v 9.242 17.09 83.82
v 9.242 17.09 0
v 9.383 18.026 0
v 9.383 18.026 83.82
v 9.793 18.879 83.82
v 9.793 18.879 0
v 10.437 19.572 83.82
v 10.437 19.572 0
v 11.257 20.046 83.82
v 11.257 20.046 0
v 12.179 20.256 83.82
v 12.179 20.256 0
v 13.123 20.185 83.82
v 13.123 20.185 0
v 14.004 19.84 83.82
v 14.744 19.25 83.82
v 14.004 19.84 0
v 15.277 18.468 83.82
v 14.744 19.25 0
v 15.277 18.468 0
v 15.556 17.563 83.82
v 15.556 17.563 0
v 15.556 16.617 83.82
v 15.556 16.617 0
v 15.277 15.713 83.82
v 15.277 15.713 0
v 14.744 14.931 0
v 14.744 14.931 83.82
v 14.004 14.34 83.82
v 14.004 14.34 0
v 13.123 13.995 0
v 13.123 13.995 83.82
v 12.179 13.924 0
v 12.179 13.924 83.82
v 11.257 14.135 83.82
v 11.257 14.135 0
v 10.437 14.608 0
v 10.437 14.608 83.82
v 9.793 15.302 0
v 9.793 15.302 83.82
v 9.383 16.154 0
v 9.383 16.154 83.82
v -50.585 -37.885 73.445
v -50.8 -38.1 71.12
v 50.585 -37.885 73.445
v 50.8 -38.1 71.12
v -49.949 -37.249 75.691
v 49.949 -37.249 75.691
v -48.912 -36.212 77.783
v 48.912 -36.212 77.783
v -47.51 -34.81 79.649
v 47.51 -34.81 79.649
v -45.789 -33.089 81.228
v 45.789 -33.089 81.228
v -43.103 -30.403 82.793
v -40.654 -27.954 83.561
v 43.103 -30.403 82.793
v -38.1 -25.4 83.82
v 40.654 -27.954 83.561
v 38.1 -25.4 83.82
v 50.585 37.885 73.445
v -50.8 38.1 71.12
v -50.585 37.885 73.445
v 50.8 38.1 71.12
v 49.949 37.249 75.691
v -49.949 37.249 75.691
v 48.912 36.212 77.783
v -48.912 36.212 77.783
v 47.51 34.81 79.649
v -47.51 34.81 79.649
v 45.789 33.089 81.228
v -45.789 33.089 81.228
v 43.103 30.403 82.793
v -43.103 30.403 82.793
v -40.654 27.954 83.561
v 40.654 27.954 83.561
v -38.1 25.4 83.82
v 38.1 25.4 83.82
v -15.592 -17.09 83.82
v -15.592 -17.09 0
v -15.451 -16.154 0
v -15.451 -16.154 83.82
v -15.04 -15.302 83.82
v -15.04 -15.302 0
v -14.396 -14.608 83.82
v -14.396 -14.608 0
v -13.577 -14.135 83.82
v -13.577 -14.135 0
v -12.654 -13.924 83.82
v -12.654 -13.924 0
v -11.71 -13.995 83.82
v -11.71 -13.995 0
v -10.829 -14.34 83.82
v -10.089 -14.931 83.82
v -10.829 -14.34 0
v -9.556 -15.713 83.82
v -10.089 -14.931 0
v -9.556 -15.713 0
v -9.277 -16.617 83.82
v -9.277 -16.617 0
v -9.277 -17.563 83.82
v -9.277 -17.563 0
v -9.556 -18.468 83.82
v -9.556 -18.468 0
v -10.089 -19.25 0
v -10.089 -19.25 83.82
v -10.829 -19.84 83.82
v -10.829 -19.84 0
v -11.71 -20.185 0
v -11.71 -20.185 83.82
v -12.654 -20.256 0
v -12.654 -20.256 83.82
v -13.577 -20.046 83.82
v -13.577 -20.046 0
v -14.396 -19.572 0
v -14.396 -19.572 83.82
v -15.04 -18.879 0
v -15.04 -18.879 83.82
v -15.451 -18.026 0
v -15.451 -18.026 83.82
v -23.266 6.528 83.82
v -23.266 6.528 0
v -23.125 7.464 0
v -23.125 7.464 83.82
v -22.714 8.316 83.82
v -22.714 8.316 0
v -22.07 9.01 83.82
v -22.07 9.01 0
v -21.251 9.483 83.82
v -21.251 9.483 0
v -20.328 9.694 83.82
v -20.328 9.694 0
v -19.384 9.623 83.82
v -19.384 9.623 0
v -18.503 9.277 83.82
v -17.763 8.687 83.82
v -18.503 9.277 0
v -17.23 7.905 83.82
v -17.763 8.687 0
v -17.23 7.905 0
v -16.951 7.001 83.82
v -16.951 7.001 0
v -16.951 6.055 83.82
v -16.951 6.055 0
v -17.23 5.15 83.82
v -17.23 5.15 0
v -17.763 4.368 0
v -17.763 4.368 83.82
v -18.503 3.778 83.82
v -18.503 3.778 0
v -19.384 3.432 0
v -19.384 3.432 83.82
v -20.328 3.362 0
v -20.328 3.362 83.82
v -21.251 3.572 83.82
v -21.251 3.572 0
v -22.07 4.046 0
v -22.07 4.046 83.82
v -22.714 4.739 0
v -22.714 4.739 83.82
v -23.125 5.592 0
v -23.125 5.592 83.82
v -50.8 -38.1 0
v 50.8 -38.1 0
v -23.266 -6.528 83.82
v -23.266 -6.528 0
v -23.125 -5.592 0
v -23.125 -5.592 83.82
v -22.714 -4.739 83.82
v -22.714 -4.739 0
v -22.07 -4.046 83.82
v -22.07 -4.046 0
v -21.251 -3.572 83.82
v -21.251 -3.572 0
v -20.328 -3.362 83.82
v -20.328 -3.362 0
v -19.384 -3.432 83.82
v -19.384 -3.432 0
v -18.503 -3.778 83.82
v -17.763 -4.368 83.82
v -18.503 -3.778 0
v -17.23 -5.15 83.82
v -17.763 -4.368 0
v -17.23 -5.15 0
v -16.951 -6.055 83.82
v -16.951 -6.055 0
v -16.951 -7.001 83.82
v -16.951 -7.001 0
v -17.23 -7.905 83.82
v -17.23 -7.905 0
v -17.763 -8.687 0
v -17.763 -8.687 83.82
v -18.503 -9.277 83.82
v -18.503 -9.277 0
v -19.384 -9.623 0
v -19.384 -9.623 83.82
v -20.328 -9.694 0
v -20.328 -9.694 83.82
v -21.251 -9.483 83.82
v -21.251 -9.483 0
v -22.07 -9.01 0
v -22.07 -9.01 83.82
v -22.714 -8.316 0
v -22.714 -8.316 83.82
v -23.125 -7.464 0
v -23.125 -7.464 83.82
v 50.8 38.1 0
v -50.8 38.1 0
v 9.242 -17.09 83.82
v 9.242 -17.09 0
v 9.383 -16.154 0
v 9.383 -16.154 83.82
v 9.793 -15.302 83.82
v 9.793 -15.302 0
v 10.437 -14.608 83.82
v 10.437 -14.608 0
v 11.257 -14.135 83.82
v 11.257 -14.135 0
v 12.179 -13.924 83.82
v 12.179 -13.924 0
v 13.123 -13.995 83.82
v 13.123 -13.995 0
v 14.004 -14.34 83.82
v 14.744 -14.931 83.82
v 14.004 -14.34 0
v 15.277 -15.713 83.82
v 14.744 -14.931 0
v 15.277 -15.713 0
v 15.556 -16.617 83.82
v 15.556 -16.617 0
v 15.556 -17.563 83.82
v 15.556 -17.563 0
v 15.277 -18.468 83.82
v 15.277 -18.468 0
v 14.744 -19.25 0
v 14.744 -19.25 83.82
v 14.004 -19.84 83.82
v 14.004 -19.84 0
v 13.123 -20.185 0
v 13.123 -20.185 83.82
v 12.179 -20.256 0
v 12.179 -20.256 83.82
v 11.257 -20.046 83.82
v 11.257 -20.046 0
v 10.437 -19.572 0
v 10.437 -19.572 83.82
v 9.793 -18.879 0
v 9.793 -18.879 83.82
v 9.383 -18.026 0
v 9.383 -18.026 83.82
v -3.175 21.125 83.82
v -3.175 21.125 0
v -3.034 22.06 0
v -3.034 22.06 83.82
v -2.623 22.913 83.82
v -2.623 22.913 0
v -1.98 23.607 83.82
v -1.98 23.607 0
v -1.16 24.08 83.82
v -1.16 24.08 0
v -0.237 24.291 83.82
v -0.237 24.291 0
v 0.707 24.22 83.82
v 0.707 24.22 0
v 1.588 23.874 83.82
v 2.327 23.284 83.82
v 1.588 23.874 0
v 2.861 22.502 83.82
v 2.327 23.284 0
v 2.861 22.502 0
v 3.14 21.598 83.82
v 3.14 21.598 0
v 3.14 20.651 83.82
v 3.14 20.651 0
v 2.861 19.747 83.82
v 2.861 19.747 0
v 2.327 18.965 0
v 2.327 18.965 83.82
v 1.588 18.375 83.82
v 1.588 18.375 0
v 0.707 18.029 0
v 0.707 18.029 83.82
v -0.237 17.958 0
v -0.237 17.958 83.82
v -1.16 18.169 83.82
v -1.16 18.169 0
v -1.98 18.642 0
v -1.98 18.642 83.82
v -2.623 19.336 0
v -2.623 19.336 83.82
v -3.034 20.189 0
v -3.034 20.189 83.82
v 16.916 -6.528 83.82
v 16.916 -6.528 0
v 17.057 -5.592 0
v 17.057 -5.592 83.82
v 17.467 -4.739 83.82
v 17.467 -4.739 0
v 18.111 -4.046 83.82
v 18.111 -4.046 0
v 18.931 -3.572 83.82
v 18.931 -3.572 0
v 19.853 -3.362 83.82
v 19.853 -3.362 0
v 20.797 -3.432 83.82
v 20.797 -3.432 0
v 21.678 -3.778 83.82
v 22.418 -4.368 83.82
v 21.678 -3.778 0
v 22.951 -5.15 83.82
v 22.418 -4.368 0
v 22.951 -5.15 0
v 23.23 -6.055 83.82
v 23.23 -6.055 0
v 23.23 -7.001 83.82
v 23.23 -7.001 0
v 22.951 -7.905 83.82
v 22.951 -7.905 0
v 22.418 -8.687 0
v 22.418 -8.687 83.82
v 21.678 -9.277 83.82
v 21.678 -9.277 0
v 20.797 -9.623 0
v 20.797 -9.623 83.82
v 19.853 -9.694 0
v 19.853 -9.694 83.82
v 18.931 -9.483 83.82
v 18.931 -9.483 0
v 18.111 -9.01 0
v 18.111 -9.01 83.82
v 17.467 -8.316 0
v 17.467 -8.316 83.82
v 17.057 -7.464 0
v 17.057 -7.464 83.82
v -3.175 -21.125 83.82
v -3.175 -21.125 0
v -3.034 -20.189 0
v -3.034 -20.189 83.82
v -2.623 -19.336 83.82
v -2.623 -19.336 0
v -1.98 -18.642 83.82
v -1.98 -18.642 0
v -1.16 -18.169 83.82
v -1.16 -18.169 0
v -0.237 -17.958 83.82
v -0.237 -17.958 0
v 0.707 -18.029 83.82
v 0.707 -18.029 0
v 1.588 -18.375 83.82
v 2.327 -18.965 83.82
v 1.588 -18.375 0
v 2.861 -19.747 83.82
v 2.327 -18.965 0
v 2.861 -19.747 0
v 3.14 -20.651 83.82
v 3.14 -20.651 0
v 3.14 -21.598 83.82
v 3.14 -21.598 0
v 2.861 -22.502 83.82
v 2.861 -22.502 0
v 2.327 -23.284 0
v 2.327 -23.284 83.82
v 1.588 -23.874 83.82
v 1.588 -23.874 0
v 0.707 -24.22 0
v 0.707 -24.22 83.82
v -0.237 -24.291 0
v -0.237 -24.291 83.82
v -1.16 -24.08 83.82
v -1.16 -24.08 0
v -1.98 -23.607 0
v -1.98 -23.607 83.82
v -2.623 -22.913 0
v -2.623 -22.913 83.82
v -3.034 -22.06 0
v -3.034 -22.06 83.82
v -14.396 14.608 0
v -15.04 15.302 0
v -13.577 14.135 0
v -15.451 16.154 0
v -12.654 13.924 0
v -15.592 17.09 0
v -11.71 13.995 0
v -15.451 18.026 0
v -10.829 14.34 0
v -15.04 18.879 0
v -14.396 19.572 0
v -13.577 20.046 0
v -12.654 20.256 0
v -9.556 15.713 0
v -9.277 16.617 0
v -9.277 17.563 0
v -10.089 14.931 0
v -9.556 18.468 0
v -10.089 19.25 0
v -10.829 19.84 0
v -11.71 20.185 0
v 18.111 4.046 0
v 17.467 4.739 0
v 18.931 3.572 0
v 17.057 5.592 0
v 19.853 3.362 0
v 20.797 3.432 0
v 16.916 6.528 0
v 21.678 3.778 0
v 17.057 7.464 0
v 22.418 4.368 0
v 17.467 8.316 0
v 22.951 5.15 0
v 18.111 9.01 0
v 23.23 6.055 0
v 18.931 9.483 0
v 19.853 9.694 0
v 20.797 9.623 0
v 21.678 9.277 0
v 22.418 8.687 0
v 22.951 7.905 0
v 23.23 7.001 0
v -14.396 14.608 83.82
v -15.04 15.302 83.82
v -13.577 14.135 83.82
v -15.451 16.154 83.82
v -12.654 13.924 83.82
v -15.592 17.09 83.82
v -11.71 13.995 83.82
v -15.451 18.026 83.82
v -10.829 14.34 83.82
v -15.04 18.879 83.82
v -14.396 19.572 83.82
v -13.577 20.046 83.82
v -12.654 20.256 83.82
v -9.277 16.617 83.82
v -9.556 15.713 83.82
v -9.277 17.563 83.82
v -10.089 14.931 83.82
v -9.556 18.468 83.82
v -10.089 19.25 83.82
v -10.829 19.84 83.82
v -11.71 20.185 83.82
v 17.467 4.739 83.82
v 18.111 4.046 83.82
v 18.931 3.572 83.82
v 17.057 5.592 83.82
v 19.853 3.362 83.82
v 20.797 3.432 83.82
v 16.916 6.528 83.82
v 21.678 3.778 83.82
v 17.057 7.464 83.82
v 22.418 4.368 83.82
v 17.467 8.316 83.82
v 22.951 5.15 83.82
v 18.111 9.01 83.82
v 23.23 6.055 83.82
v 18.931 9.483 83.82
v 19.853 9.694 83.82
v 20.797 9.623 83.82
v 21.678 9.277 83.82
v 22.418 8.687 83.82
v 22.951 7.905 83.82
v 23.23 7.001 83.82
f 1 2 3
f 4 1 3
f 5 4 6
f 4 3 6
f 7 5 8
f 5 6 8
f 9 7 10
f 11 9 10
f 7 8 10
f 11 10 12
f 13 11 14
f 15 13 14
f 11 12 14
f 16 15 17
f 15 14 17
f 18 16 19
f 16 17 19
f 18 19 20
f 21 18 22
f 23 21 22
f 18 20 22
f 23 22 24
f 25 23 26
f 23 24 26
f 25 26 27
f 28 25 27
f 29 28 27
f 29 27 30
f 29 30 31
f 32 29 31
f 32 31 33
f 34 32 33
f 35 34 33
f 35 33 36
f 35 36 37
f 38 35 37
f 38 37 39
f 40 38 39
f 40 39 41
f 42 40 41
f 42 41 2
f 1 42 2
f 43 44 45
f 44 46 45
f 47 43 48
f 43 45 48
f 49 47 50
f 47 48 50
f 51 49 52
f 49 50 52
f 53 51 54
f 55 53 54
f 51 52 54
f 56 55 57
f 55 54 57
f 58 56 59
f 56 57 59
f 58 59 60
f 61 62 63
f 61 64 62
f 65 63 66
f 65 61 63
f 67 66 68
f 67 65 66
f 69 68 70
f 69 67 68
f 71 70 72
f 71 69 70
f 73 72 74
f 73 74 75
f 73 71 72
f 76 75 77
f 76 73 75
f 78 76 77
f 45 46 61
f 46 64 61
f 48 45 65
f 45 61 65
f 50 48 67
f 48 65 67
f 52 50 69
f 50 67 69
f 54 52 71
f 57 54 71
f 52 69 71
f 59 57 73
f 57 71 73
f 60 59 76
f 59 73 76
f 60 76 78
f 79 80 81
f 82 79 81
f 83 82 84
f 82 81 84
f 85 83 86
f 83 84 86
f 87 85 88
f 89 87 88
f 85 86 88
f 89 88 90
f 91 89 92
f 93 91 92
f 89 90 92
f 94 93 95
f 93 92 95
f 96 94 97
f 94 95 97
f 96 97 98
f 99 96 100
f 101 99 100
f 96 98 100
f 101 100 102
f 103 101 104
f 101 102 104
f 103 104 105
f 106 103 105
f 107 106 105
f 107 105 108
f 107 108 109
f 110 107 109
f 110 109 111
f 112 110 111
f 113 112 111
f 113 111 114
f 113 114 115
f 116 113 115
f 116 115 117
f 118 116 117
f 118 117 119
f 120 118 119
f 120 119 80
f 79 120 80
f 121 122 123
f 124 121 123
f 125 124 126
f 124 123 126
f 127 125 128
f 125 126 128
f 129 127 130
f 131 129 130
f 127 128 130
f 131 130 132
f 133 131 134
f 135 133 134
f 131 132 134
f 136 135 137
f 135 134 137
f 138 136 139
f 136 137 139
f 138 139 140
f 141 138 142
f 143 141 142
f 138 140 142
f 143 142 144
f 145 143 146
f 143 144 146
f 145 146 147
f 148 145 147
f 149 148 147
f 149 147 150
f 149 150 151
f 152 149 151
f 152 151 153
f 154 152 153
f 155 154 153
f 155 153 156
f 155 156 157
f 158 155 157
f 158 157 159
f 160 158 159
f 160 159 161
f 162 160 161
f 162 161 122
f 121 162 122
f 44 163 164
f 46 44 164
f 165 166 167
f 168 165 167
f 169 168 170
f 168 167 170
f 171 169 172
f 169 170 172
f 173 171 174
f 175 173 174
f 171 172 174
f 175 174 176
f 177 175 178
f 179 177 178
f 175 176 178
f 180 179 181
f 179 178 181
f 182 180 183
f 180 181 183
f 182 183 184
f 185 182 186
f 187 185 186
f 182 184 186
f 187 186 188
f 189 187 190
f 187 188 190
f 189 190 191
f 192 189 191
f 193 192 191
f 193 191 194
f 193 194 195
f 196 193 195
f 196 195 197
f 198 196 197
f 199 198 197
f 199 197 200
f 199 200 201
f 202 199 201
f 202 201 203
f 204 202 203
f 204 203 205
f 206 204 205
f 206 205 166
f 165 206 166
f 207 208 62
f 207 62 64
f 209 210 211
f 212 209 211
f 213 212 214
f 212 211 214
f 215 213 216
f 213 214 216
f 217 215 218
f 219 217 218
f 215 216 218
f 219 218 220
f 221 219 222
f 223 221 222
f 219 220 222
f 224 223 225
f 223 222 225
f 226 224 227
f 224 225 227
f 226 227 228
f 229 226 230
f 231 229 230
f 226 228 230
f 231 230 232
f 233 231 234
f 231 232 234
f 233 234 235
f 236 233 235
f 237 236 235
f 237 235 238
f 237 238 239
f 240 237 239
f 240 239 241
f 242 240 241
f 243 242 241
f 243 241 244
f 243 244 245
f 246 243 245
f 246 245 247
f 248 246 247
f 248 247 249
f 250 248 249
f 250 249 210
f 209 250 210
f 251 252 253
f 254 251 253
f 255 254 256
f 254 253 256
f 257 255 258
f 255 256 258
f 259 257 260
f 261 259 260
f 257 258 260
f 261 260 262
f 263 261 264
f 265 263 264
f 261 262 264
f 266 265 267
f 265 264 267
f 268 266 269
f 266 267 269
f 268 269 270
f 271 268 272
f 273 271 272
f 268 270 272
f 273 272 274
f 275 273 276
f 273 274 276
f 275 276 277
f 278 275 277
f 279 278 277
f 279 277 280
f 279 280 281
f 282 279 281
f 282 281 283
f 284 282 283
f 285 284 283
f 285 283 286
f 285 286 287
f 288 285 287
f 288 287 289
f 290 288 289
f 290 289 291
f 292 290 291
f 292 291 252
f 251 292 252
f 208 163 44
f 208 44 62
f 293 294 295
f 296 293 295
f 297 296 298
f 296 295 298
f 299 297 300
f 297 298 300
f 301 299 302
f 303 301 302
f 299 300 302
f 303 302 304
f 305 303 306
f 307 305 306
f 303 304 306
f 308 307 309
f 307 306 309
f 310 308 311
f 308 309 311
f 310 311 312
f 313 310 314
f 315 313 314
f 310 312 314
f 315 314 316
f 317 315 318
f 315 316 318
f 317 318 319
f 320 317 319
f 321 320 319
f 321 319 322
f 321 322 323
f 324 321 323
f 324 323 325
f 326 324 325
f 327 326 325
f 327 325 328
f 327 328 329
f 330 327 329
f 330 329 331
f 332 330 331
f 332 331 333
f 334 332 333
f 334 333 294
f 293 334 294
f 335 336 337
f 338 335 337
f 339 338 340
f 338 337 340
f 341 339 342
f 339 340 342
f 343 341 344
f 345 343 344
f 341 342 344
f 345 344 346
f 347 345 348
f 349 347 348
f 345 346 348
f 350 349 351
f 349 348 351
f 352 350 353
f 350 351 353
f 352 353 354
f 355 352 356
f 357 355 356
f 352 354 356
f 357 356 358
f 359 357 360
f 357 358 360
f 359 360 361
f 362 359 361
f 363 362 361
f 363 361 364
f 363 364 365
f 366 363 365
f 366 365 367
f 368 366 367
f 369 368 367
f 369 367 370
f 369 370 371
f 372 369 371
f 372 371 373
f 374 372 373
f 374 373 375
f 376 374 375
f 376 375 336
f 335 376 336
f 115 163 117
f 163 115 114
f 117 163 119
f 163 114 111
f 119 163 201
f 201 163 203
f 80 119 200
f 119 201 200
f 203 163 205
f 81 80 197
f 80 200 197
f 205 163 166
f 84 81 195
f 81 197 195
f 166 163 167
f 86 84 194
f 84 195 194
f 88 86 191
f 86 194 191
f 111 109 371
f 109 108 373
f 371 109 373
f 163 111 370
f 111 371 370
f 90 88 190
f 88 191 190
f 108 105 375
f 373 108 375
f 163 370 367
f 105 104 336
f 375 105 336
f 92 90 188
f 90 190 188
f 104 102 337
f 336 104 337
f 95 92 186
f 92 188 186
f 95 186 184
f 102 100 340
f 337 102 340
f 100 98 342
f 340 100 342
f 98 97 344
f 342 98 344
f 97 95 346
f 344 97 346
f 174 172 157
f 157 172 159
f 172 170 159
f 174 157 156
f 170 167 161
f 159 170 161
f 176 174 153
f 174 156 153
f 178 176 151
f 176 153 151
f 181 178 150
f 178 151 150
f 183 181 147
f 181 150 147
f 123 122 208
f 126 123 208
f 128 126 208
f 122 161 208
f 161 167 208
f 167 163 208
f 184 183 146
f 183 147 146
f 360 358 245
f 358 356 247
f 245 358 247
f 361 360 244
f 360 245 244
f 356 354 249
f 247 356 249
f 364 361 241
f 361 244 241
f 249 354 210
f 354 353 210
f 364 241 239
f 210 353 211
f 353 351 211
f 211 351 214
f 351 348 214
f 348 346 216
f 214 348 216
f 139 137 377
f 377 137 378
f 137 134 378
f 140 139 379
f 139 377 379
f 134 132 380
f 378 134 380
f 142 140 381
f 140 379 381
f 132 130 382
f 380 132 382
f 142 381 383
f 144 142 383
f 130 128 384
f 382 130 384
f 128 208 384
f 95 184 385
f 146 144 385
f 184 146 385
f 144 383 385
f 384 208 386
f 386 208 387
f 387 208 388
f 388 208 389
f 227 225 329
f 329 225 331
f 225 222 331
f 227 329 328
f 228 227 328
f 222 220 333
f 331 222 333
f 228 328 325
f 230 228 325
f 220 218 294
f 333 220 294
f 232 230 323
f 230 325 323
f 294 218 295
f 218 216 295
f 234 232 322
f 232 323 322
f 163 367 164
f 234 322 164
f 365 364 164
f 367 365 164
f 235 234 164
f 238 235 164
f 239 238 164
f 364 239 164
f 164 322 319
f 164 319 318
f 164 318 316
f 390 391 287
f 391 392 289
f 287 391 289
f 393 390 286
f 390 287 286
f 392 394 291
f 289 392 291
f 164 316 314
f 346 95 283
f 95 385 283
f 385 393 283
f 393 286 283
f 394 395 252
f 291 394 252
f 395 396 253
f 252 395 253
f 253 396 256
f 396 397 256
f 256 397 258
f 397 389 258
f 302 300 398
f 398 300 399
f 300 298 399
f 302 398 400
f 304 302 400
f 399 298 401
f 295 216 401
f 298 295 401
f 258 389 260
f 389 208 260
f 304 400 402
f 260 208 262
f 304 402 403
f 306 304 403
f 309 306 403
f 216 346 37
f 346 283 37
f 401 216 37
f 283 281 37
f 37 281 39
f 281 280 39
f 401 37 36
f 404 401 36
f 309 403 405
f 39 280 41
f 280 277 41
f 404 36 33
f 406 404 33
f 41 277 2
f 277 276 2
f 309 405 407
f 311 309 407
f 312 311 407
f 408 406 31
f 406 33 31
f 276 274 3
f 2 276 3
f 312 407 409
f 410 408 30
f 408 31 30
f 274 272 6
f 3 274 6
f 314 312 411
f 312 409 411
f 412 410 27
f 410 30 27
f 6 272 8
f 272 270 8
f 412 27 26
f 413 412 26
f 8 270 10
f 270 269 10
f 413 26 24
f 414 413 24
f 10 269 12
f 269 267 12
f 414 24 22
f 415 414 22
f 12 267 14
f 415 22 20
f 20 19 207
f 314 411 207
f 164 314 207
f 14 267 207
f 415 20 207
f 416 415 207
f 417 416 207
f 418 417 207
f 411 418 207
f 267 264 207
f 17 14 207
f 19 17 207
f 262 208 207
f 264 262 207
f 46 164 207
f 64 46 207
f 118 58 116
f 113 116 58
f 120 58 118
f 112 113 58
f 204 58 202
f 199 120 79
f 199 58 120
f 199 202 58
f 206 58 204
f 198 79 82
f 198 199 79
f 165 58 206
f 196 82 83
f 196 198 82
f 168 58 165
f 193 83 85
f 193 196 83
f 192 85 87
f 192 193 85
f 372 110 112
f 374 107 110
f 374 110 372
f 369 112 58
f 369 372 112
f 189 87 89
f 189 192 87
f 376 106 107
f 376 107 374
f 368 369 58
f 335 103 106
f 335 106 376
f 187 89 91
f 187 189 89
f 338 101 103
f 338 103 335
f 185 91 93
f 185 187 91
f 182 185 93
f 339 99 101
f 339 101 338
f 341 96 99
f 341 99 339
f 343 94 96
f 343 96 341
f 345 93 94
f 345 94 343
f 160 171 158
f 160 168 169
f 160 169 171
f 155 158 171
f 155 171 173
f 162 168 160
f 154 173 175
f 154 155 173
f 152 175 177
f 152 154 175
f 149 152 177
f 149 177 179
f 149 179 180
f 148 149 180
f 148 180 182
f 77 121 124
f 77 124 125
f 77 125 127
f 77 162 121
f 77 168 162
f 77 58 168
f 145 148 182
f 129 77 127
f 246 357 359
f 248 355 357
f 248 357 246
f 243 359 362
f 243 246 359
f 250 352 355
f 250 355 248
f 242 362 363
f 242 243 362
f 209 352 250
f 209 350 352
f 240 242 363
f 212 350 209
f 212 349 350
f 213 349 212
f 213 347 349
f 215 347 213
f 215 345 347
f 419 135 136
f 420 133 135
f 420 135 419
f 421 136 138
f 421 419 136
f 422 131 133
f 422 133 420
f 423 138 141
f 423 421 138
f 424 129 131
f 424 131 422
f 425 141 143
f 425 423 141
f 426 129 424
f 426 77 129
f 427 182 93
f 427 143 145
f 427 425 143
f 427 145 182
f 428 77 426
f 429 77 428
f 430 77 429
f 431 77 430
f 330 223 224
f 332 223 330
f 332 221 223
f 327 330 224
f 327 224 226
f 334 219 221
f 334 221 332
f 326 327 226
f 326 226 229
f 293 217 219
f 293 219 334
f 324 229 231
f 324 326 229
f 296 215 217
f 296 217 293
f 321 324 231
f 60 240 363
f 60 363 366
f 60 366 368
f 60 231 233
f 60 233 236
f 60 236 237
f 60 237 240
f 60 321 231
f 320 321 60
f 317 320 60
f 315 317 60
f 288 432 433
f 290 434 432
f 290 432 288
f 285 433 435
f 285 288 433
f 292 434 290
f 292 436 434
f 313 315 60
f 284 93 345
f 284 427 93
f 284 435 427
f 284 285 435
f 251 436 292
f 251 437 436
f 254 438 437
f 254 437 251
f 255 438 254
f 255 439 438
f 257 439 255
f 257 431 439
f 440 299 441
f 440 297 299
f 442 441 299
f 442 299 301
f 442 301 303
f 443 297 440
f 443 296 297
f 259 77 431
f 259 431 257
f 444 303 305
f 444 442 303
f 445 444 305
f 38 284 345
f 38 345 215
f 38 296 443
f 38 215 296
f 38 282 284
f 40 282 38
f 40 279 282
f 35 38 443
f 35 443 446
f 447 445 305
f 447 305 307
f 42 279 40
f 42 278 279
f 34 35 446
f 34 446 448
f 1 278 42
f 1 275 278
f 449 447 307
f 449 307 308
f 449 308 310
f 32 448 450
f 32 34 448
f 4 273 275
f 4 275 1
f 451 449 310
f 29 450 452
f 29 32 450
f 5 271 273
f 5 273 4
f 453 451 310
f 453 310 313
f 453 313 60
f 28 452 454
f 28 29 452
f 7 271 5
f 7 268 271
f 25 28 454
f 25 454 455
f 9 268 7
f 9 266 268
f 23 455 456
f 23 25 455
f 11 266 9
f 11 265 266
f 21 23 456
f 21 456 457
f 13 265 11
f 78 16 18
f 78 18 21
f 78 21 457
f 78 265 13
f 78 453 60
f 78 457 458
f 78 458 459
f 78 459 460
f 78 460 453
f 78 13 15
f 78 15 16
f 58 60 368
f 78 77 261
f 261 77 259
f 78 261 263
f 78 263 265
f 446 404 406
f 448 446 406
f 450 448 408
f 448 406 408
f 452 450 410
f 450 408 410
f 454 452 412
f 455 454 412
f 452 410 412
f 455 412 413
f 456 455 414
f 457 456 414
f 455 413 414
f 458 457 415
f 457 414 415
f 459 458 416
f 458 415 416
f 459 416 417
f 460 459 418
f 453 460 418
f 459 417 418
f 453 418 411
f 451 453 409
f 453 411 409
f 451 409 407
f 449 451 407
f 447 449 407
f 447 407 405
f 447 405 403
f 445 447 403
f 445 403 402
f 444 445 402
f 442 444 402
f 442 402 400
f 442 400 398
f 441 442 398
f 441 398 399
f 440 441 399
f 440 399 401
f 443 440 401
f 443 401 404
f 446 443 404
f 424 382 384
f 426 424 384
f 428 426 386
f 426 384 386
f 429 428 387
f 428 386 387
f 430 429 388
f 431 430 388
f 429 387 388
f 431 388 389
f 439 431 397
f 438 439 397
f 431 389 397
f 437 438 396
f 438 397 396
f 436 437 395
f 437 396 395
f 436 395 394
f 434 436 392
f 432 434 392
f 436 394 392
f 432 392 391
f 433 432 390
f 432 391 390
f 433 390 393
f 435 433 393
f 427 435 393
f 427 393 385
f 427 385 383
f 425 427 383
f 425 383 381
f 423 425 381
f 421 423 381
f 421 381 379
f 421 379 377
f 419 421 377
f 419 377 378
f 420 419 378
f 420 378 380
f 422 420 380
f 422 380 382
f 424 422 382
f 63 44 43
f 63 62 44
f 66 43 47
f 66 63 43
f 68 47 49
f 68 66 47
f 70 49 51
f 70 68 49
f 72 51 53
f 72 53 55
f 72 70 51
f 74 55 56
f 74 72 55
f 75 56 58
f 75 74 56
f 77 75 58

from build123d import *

# Parameters (mm, degrees)
F0_W     = 101.6
F0_H     = 76.2
F1_DEPTH = 83.82
F2_R     = 12.7
F5_D     = 6.35


with BuildPart() as f1:
    # F0 (on Top) → F1 (new body)
    with BuildSketch(Plane.XY):
        Rectangle(F0_W, F0_H)
    extrude(amount=F1_DEPTH)

    # F2
    f2_edges = [f1.edges().sort_by_distance(p)[0] for p in [
        (0, -38.1, 83.82),
        (50.8, 0, 83.82),
        (0, 38.1, 83.82),
        (-50.8, 0, 83.82),
    ]]
    fillet(f2_edges, radius=F2_R)

    # F5 (through all)
    with Locations(Plane.XY.offset(83.82)):
        with Locations((12.416681, -17.090095), (0, -21.124519), (-12.416681, -17.090095), (-20.090612, -6.527835), (-20.090612, 6.527835), (-12.416681, 17.090095), (0, 21.124519), (12.416681, 17.090095), (20.090612, 6.527835), (20.090612, -6.527835)):
            Hole(F5_D / 2)


solid = f1.part
